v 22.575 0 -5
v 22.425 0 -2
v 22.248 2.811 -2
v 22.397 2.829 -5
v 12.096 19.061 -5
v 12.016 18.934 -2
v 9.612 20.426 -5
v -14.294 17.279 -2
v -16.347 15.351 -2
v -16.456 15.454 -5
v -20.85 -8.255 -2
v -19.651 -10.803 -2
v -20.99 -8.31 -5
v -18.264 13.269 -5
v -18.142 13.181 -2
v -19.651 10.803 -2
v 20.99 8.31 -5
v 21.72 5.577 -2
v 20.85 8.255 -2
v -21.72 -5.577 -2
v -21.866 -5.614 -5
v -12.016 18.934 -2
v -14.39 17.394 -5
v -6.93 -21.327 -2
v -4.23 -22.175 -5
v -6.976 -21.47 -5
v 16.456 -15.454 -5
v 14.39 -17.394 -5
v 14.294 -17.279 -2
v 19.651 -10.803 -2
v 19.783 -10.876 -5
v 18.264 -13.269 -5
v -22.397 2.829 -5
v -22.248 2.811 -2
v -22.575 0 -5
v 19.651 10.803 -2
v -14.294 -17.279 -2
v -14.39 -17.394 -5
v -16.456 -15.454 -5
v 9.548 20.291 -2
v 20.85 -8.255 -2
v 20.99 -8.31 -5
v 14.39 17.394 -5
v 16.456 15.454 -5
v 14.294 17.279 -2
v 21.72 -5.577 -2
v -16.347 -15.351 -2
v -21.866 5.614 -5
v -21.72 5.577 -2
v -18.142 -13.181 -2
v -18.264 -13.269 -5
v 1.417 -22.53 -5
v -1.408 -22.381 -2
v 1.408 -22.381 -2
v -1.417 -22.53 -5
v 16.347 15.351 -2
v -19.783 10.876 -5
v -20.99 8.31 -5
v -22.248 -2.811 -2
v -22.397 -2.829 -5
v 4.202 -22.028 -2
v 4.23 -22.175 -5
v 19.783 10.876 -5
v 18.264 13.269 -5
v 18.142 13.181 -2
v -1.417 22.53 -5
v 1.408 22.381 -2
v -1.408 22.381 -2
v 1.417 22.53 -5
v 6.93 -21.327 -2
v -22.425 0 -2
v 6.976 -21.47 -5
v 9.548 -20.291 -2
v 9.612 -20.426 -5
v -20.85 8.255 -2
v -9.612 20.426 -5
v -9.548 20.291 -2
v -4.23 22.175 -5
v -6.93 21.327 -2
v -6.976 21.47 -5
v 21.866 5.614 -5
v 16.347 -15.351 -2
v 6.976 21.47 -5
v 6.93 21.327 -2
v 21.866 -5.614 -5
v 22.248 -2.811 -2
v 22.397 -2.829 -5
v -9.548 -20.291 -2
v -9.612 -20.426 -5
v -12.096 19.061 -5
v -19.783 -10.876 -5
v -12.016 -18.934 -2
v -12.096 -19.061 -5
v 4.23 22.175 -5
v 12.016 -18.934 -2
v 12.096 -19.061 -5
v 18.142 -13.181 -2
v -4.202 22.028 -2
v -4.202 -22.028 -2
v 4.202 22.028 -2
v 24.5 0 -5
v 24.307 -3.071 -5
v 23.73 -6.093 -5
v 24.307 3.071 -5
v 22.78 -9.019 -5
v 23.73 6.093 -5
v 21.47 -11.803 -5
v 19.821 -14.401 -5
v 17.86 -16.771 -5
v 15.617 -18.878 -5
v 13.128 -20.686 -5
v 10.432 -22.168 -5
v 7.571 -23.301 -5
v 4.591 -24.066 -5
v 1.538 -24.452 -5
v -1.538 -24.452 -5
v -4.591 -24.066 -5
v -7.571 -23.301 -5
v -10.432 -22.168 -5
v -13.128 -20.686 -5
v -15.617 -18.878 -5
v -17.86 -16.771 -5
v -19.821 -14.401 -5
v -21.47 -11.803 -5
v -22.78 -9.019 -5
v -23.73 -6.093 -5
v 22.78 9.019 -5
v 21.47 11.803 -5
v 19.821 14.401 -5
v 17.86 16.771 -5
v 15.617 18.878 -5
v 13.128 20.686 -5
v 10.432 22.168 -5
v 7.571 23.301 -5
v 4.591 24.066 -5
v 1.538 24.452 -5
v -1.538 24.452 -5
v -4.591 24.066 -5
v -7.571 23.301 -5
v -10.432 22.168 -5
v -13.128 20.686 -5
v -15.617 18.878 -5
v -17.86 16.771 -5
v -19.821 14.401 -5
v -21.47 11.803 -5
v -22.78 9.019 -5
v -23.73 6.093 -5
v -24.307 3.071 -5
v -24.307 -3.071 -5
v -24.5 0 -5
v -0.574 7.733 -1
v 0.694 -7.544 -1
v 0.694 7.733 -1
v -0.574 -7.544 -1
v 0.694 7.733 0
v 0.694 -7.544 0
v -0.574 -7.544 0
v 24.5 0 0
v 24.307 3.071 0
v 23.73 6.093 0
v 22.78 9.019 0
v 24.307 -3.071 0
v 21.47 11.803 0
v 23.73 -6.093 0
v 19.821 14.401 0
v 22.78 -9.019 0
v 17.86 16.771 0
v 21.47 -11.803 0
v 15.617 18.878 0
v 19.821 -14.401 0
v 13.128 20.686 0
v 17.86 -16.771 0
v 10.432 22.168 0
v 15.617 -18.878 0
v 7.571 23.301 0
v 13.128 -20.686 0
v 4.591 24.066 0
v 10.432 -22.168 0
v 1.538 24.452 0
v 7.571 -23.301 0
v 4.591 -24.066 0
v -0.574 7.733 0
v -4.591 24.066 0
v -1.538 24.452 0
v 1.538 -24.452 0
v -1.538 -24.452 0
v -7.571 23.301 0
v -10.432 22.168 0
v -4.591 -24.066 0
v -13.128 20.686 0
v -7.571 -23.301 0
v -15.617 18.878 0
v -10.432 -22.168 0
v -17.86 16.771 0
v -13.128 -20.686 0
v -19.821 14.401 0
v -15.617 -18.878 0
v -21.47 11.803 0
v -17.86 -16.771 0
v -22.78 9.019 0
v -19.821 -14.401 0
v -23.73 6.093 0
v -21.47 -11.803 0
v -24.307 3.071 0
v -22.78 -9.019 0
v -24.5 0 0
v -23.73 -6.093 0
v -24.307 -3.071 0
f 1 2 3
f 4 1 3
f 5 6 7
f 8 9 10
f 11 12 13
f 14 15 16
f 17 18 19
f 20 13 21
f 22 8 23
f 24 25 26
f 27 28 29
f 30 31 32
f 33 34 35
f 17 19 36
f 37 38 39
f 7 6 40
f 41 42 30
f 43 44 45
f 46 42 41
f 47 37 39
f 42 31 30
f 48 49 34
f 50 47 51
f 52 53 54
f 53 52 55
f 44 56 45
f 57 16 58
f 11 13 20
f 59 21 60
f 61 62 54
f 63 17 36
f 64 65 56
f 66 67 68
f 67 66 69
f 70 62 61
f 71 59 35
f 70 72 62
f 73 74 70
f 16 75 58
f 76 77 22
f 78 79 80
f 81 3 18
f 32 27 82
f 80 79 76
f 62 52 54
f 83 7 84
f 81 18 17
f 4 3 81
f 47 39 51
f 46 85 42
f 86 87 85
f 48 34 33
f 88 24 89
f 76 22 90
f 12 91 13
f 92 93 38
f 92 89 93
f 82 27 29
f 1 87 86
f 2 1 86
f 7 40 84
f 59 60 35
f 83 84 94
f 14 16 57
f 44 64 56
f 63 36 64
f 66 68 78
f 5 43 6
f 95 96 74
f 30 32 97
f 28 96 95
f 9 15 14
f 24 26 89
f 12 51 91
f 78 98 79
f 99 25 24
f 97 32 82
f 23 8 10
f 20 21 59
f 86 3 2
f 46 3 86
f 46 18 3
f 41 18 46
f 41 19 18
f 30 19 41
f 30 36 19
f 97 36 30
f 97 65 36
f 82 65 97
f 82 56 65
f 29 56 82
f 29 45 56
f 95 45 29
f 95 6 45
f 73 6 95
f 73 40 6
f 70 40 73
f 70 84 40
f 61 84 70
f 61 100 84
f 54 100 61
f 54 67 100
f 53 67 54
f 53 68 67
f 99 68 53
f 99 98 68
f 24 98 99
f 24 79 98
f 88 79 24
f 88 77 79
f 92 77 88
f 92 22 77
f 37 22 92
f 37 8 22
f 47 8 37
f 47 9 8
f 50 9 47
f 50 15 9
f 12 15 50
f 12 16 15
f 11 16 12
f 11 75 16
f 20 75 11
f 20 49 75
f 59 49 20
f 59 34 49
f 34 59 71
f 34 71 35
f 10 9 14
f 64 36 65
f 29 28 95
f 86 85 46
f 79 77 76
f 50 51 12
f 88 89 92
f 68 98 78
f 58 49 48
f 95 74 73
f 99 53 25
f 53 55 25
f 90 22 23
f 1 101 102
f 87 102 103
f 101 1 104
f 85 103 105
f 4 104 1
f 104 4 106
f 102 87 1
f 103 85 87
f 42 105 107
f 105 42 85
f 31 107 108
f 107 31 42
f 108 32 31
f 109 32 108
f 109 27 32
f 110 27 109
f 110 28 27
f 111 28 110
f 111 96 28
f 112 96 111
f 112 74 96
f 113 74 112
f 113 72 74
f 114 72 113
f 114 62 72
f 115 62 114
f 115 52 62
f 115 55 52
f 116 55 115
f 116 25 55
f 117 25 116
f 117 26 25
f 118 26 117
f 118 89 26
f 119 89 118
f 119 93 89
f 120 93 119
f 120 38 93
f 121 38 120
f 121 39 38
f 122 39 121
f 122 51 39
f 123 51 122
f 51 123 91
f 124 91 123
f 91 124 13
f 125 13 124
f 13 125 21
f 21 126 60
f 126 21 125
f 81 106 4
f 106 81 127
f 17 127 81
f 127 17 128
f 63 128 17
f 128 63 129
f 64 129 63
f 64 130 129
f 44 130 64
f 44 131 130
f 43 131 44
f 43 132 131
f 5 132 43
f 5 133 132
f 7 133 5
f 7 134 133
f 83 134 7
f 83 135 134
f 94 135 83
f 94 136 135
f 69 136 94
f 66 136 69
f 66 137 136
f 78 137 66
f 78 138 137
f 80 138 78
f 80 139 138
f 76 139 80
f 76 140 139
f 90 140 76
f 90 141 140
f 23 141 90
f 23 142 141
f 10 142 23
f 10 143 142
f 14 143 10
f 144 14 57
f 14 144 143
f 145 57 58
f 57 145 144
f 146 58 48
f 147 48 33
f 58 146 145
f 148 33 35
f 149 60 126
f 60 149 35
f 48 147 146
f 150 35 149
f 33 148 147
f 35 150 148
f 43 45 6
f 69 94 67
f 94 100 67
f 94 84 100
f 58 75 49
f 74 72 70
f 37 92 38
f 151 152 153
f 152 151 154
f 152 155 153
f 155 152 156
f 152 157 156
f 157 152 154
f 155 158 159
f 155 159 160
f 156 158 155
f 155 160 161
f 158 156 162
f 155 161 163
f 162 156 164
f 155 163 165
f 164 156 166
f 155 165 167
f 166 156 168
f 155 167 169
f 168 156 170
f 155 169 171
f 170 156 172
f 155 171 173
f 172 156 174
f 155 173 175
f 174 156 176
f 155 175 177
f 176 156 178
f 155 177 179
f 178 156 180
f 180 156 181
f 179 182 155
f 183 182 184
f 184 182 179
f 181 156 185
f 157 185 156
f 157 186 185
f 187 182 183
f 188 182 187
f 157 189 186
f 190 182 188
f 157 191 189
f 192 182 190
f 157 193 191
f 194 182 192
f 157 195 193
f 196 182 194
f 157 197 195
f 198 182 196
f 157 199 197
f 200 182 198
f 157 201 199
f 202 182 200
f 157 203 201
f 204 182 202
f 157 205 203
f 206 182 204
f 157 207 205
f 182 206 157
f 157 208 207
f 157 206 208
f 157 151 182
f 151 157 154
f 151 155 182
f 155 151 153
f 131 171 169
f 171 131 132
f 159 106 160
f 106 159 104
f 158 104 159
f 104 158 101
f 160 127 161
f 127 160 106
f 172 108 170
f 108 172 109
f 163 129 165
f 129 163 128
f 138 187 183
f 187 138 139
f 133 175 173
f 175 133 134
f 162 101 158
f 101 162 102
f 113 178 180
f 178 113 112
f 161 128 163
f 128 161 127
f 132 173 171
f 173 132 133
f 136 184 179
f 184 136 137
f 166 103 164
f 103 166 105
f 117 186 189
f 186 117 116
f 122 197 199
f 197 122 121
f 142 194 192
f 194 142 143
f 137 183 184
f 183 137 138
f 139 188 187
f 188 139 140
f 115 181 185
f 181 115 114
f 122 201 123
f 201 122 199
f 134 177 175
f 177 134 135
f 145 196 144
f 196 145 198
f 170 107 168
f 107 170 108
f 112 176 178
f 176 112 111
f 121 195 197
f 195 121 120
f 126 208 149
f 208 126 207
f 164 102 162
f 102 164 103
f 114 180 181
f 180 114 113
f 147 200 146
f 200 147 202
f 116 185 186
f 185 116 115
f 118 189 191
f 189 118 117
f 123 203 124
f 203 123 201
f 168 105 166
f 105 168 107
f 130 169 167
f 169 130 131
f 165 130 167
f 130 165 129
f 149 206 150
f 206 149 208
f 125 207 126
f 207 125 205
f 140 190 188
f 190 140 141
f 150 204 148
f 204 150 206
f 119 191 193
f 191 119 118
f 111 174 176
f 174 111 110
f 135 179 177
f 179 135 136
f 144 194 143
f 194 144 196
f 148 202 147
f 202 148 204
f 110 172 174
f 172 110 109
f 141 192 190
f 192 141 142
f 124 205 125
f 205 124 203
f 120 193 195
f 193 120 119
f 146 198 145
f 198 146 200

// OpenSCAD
$fn = 50;

difference() {
	union() {
		translate(v = [0, 0, -5.0]) {
			cylinder(h = 5, r = 24.5);
		}
	}
	union() {
		#translate(v = [0, 0, -5.0]) {
			cylinder(h = 3, r1 = 22.575, r2 = 22.425);
		}
		translate(v = [0, 0, -1]) {
			linear_extrude(height = 1) {
				text(font = "Wingdings", halign = "center", size = 11, text = "|", valign = "center");
			}
		}
	}
}
